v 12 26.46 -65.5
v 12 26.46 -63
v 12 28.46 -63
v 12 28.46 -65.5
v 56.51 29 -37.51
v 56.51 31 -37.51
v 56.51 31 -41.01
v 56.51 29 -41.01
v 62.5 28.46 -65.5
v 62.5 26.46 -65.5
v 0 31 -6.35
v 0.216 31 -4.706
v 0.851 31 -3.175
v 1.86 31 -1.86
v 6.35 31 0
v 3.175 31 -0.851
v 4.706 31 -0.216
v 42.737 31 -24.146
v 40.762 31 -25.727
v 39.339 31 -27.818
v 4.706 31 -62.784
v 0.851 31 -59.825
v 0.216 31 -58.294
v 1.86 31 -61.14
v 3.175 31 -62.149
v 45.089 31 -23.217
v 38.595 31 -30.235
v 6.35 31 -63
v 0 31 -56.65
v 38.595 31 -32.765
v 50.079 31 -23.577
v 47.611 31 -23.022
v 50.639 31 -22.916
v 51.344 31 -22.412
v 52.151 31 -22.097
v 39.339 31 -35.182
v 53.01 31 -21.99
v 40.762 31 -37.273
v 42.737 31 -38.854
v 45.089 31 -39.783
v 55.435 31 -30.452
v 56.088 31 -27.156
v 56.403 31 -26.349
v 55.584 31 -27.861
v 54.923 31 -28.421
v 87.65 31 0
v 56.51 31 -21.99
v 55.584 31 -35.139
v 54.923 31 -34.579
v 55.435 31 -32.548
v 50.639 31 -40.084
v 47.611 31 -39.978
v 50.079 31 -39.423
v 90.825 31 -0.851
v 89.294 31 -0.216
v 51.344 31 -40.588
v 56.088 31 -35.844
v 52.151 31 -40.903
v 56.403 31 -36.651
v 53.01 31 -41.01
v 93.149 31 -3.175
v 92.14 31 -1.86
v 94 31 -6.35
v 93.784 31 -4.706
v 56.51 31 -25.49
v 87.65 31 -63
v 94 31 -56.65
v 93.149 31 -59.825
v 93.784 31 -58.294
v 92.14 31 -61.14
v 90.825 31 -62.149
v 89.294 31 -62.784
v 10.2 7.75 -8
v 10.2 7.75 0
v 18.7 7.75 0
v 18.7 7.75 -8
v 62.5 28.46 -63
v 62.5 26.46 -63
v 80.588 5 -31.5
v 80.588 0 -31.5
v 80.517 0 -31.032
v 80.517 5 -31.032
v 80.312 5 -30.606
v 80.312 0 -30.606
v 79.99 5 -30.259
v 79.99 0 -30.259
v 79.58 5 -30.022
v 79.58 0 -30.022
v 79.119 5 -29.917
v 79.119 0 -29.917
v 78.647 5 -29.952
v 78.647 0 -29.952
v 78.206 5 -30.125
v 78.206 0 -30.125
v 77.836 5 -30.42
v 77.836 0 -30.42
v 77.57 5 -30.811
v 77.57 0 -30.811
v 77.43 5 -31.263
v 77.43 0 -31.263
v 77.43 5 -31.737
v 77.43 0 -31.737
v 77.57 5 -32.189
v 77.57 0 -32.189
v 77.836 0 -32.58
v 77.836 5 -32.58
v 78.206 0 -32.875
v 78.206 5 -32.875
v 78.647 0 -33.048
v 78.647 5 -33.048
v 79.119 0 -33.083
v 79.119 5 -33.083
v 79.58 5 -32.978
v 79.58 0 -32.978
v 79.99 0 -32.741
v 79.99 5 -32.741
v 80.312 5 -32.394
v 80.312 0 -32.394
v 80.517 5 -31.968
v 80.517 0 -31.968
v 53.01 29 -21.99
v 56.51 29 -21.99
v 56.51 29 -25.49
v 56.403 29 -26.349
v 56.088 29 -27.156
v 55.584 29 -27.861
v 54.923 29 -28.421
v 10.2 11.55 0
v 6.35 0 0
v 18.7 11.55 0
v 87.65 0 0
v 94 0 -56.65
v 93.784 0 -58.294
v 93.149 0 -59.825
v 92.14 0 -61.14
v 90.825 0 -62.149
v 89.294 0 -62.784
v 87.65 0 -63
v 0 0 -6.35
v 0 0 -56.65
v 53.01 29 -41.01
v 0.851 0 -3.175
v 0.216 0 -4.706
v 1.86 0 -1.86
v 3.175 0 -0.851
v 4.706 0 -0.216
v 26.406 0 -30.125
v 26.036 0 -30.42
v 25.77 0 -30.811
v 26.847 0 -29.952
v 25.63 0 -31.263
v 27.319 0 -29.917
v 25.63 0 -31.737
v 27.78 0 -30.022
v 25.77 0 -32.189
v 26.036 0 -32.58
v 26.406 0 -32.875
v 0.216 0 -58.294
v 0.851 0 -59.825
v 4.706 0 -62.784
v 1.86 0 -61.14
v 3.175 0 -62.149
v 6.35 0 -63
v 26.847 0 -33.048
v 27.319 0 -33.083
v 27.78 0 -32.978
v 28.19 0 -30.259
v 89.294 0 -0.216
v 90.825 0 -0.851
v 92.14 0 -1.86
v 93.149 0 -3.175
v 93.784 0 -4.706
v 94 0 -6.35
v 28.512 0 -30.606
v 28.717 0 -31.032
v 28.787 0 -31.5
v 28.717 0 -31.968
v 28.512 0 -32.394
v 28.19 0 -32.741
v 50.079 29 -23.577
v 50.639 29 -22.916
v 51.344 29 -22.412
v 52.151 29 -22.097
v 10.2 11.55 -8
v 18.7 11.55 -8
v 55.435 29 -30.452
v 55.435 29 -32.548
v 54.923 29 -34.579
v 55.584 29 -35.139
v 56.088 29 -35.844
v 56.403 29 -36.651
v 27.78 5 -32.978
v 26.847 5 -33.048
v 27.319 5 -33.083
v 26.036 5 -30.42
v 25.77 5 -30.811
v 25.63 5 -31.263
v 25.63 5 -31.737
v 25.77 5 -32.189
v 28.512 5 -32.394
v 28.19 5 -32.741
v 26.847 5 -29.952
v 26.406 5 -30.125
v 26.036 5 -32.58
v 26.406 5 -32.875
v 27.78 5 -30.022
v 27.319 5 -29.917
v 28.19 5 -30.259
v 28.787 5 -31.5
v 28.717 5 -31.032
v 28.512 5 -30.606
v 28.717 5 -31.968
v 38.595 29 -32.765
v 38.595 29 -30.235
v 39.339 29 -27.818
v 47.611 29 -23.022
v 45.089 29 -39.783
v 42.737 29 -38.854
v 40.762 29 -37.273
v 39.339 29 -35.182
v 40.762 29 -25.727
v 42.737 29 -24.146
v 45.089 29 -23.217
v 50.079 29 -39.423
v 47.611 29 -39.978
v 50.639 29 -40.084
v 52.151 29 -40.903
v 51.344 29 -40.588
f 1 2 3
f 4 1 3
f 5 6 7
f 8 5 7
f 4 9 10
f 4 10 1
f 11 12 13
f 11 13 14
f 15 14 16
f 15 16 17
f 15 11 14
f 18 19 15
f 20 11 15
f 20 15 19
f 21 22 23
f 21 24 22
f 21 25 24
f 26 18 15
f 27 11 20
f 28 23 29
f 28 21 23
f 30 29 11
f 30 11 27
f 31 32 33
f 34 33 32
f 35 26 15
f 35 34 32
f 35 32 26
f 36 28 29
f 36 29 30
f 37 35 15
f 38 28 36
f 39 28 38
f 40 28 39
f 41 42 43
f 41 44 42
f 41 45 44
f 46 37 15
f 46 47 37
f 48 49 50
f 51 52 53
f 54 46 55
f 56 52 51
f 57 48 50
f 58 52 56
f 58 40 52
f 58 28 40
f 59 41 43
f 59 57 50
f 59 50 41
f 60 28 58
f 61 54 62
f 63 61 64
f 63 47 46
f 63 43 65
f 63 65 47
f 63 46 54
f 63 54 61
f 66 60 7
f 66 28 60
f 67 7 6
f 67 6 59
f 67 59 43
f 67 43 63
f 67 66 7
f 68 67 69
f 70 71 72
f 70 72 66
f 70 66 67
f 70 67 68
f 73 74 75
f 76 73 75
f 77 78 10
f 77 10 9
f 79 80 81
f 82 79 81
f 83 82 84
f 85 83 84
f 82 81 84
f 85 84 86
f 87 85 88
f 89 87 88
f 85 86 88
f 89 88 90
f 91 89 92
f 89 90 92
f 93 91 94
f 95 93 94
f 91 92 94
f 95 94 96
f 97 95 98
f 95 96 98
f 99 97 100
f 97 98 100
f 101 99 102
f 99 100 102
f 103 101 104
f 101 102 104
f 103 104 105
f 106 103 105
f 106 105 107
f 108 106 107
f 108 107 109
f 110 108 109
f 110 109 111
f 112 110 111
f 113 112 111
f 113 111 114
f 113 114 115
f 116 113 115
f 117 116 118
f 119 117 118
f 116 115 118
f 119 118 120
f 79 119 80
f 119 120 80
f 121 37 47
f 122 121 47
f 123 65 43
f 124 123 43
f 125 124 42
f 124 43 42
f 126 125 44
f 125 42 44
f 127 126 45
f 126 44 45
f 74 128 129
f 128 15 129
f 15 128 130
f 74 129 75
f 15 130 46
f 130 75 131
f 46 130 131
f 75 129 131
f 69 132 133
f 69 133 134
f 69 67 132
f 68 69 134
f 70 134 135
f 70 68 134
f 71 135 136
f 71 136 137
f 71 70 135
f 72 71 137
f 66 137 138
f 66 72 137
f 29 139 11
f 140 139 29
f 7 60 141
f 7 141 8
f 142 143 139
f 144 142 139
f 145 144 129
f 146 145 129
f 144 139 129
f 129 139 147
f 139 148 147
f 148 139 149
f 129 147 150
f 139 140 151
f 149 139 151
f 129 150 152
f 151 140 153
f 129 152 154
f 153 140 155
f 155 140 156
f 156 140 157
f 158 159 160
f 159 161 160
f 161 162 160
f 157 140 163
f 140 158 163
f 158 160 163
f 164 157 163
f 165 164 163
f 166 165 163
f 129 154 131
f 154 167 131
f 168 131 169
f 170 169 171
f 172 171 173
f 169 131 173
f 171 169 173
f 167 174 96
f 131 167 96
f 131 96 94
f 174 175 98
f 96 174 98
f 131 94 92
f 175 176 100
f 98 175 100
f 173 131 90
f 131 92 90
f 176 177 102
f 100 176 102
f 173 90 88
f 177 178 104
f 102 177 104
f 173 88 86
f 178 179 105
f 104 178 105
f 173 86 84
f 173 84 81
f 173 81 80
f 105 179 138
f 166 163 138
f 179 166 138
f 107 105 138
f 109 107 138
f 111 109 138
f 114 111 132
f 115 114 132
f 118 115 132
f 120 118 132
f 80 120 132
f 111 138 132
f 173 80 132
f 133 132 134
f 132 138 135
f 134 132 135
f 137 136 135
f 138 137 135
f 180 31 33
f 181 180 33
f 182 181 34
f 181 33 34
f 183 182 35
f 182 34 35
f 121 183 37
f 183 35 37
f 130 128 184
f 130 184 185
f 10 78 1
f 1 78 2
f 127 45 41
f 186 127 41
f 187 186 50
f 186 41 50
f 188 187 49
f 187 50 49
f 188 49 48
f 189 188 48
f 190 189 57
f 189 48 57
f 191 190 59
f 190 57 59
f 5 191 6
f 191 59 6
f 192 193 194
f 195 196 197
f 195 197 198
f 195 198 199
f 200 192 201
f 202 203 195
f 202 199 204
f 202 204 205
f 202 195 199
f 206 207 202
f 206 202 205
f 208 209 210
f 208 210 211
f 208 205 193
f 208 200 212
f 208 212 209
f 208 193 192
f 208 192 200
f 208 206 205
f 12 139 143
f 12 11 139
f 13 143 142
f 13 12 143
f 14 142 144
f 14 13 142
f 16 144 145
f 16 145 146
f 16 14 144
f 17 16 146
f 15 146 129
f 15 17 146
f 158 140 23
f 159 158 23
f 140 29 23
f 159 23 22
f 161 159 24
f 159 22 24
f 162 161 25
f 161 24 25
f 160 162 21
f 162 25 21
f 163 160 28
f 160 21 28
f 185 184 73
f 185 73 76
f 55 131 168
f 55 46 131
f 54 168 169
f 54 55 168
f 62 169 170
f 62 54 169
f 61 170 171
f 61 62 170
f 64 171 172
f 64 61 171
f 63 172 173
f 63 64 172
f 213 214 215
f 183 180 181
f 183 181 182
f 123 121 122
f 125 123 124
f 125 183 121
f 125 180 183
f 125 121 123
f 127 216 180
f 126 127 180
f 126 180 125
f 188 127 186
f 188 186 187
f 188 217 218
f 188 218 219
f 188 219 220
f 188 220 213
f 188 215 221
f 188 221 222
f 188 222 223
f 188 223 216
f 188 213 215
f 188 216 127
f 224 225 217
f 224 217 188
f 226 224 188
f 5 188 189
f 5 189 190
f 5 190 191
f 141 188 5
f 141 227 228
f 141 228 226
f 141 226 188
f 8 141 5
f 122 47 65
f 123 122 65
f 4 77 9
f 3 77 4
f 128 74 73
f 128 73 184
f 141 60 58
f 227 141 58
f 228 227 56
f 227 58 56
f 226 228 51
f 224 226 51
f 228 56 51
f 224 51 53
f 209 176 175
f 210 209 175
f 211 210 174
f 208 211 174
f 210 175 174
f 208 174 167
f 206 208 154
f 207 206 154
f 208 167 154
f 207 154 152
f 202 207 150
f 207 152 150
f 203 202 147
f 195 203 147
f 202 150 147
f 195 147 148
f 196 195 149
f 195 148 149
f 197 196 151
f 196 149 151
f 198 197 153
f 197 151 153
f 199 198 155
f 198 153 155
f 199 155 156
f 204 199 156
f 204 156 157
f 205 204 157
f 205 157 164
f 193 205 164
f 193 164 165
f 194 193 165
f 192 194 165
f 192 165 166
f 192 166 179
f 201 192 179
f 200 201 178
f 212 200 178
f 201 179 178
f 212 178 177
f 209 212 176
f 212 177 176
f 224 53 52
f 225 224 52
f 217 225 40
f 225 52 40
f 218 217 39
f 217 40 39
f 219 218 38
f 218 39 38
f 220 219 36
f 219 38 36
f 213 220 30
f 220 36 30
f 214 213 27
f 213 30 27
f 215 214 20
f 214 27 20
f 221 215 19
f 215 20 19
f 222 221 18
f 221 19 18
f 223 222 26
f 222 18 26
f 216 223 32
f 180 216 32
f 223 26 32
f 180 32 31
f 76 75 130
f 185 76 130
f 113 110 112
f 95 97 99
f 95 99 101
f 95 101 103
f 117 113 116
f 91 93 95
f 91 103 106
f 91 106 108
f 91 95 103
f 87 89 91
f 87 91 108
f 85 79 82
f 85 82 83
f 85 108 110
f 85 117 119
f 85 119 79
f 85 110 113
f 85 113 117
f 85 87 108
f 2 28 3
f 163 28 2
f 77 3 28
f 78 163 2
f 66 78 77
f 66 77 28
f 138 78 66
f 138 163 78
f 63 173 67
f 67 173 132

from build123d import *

# Parameters (mm, degrees)
SKETCH1_W           = 94
SKETCH1_H           = 63
BOSS_EXTRUDE1_DEPTH = 31
FILLET1_R           = 6.35
SKETCH3_W           = 50.5
SKETCH3_H           = 2
BOSS_EXTRUDE2_DEPTH = 2.5
SKETCH4_W           = 8.5
SKETCH4_H           = 3.8
CUT_EXTRUDE1_DEPTH  = 8
SKETCH5_R           = 8.5
SKETCH5_R_2         = 3.5
SKETCH5_W           = 3.5
SKETCH5_H           = 3.5
CUT_EXTRUDE2_DEPTH  = 2
SKETCH6_R           = 1.5875
CUT_EXTRUDE3_DEPTH  = 5


with BuildPart() as part:
    # Sketch1 → Boss-Extrude1 (new body)
    with BuildSketch(Plane(origin=(0, 0, 0), x_dir=(1, 0, 0), z_dir=(0, 1, 0))):
        with Locations((47, 31.5)):
            Rectangle(SKETCH1_W, SKETCH1_H)
    extrude(amount=BOSS_EXTRUDE1_DEPTH)

    # Fillet1
    fillet1_edges = [part.edges().sort_by_distance(p)[0] for p in [
        (0, 15.5, 0),
        (0, 15.5, -63),
        (94, 15.5, -63),
        (94, 15.5, 0),
    ]]
    fillet(fillet1_edges, radius=FILLET1_R)

    # Sketch3 → Boss-Extrude2 (add)
    with BuildSketch(Plane(origin=(0, 0, -63), x_dir=(-1, 0, 0), z_dir=(0, 0, -1))):
        with Locations((-37.25, 27.46)):
            Rectangle(SKETCH3_W, SKETCH3_H)
    extrude(amount=BOSS_EXTRUDE2_DEPTH)

    # Sketch4 → Cut-Extrude1 (cut)
    with BuildSketch(Plane.XY):
        with Locations((14.45, 9.65)):
            Rectangle(SKETCH4_W, SKETCH4_H)
    extrude(amount=-CUT_EXTRUDE1_DEPTH, mode=Mode.SUBTRACT)

    # Sketch5 → Cut-Extrude2 (cut)
    with BuildSketch(Plane(origin=(0, 31, 0), x_dir=(1, 0, 0), z_dir=(0, 1, 0))):
        with Locations((47, 31.5)):
            Circle(SKETCH5_R)
        with Locations((53.01040764, 37.51040764)):
            Circle(SKETCH5_R_2)
        with Locations((53.01040764, 25.48959236)):
            Circle(SKETCH5_R_2)
        with Locations((54.76040764, 39.26040764)):
            Rectangle(SKETCH5_W, SKETCH5_H)
        with Locations((54.76040764, 23.73959236)):
            Rectangle(SKETCH5_W, SKETCH5_H)
    extrude(amount=-CUT_EXTRUDE2_DEPTH, mode=Mode.SUBTRACT)

    # Sketch6 → Cut-Extrude3 (cut)
    with BuildSketch(Plane.XZ):
        with Locations((27.2, -31.5)):
            Circle(SKETCH6_R)
        with Locations((79, -31.5)):
            Circle(SKETCH6_R)
    extrude(amount=-CUT_EXTRUDE3_DEPTH, mode=Mode.SUBTRACT)


solid = part.part
